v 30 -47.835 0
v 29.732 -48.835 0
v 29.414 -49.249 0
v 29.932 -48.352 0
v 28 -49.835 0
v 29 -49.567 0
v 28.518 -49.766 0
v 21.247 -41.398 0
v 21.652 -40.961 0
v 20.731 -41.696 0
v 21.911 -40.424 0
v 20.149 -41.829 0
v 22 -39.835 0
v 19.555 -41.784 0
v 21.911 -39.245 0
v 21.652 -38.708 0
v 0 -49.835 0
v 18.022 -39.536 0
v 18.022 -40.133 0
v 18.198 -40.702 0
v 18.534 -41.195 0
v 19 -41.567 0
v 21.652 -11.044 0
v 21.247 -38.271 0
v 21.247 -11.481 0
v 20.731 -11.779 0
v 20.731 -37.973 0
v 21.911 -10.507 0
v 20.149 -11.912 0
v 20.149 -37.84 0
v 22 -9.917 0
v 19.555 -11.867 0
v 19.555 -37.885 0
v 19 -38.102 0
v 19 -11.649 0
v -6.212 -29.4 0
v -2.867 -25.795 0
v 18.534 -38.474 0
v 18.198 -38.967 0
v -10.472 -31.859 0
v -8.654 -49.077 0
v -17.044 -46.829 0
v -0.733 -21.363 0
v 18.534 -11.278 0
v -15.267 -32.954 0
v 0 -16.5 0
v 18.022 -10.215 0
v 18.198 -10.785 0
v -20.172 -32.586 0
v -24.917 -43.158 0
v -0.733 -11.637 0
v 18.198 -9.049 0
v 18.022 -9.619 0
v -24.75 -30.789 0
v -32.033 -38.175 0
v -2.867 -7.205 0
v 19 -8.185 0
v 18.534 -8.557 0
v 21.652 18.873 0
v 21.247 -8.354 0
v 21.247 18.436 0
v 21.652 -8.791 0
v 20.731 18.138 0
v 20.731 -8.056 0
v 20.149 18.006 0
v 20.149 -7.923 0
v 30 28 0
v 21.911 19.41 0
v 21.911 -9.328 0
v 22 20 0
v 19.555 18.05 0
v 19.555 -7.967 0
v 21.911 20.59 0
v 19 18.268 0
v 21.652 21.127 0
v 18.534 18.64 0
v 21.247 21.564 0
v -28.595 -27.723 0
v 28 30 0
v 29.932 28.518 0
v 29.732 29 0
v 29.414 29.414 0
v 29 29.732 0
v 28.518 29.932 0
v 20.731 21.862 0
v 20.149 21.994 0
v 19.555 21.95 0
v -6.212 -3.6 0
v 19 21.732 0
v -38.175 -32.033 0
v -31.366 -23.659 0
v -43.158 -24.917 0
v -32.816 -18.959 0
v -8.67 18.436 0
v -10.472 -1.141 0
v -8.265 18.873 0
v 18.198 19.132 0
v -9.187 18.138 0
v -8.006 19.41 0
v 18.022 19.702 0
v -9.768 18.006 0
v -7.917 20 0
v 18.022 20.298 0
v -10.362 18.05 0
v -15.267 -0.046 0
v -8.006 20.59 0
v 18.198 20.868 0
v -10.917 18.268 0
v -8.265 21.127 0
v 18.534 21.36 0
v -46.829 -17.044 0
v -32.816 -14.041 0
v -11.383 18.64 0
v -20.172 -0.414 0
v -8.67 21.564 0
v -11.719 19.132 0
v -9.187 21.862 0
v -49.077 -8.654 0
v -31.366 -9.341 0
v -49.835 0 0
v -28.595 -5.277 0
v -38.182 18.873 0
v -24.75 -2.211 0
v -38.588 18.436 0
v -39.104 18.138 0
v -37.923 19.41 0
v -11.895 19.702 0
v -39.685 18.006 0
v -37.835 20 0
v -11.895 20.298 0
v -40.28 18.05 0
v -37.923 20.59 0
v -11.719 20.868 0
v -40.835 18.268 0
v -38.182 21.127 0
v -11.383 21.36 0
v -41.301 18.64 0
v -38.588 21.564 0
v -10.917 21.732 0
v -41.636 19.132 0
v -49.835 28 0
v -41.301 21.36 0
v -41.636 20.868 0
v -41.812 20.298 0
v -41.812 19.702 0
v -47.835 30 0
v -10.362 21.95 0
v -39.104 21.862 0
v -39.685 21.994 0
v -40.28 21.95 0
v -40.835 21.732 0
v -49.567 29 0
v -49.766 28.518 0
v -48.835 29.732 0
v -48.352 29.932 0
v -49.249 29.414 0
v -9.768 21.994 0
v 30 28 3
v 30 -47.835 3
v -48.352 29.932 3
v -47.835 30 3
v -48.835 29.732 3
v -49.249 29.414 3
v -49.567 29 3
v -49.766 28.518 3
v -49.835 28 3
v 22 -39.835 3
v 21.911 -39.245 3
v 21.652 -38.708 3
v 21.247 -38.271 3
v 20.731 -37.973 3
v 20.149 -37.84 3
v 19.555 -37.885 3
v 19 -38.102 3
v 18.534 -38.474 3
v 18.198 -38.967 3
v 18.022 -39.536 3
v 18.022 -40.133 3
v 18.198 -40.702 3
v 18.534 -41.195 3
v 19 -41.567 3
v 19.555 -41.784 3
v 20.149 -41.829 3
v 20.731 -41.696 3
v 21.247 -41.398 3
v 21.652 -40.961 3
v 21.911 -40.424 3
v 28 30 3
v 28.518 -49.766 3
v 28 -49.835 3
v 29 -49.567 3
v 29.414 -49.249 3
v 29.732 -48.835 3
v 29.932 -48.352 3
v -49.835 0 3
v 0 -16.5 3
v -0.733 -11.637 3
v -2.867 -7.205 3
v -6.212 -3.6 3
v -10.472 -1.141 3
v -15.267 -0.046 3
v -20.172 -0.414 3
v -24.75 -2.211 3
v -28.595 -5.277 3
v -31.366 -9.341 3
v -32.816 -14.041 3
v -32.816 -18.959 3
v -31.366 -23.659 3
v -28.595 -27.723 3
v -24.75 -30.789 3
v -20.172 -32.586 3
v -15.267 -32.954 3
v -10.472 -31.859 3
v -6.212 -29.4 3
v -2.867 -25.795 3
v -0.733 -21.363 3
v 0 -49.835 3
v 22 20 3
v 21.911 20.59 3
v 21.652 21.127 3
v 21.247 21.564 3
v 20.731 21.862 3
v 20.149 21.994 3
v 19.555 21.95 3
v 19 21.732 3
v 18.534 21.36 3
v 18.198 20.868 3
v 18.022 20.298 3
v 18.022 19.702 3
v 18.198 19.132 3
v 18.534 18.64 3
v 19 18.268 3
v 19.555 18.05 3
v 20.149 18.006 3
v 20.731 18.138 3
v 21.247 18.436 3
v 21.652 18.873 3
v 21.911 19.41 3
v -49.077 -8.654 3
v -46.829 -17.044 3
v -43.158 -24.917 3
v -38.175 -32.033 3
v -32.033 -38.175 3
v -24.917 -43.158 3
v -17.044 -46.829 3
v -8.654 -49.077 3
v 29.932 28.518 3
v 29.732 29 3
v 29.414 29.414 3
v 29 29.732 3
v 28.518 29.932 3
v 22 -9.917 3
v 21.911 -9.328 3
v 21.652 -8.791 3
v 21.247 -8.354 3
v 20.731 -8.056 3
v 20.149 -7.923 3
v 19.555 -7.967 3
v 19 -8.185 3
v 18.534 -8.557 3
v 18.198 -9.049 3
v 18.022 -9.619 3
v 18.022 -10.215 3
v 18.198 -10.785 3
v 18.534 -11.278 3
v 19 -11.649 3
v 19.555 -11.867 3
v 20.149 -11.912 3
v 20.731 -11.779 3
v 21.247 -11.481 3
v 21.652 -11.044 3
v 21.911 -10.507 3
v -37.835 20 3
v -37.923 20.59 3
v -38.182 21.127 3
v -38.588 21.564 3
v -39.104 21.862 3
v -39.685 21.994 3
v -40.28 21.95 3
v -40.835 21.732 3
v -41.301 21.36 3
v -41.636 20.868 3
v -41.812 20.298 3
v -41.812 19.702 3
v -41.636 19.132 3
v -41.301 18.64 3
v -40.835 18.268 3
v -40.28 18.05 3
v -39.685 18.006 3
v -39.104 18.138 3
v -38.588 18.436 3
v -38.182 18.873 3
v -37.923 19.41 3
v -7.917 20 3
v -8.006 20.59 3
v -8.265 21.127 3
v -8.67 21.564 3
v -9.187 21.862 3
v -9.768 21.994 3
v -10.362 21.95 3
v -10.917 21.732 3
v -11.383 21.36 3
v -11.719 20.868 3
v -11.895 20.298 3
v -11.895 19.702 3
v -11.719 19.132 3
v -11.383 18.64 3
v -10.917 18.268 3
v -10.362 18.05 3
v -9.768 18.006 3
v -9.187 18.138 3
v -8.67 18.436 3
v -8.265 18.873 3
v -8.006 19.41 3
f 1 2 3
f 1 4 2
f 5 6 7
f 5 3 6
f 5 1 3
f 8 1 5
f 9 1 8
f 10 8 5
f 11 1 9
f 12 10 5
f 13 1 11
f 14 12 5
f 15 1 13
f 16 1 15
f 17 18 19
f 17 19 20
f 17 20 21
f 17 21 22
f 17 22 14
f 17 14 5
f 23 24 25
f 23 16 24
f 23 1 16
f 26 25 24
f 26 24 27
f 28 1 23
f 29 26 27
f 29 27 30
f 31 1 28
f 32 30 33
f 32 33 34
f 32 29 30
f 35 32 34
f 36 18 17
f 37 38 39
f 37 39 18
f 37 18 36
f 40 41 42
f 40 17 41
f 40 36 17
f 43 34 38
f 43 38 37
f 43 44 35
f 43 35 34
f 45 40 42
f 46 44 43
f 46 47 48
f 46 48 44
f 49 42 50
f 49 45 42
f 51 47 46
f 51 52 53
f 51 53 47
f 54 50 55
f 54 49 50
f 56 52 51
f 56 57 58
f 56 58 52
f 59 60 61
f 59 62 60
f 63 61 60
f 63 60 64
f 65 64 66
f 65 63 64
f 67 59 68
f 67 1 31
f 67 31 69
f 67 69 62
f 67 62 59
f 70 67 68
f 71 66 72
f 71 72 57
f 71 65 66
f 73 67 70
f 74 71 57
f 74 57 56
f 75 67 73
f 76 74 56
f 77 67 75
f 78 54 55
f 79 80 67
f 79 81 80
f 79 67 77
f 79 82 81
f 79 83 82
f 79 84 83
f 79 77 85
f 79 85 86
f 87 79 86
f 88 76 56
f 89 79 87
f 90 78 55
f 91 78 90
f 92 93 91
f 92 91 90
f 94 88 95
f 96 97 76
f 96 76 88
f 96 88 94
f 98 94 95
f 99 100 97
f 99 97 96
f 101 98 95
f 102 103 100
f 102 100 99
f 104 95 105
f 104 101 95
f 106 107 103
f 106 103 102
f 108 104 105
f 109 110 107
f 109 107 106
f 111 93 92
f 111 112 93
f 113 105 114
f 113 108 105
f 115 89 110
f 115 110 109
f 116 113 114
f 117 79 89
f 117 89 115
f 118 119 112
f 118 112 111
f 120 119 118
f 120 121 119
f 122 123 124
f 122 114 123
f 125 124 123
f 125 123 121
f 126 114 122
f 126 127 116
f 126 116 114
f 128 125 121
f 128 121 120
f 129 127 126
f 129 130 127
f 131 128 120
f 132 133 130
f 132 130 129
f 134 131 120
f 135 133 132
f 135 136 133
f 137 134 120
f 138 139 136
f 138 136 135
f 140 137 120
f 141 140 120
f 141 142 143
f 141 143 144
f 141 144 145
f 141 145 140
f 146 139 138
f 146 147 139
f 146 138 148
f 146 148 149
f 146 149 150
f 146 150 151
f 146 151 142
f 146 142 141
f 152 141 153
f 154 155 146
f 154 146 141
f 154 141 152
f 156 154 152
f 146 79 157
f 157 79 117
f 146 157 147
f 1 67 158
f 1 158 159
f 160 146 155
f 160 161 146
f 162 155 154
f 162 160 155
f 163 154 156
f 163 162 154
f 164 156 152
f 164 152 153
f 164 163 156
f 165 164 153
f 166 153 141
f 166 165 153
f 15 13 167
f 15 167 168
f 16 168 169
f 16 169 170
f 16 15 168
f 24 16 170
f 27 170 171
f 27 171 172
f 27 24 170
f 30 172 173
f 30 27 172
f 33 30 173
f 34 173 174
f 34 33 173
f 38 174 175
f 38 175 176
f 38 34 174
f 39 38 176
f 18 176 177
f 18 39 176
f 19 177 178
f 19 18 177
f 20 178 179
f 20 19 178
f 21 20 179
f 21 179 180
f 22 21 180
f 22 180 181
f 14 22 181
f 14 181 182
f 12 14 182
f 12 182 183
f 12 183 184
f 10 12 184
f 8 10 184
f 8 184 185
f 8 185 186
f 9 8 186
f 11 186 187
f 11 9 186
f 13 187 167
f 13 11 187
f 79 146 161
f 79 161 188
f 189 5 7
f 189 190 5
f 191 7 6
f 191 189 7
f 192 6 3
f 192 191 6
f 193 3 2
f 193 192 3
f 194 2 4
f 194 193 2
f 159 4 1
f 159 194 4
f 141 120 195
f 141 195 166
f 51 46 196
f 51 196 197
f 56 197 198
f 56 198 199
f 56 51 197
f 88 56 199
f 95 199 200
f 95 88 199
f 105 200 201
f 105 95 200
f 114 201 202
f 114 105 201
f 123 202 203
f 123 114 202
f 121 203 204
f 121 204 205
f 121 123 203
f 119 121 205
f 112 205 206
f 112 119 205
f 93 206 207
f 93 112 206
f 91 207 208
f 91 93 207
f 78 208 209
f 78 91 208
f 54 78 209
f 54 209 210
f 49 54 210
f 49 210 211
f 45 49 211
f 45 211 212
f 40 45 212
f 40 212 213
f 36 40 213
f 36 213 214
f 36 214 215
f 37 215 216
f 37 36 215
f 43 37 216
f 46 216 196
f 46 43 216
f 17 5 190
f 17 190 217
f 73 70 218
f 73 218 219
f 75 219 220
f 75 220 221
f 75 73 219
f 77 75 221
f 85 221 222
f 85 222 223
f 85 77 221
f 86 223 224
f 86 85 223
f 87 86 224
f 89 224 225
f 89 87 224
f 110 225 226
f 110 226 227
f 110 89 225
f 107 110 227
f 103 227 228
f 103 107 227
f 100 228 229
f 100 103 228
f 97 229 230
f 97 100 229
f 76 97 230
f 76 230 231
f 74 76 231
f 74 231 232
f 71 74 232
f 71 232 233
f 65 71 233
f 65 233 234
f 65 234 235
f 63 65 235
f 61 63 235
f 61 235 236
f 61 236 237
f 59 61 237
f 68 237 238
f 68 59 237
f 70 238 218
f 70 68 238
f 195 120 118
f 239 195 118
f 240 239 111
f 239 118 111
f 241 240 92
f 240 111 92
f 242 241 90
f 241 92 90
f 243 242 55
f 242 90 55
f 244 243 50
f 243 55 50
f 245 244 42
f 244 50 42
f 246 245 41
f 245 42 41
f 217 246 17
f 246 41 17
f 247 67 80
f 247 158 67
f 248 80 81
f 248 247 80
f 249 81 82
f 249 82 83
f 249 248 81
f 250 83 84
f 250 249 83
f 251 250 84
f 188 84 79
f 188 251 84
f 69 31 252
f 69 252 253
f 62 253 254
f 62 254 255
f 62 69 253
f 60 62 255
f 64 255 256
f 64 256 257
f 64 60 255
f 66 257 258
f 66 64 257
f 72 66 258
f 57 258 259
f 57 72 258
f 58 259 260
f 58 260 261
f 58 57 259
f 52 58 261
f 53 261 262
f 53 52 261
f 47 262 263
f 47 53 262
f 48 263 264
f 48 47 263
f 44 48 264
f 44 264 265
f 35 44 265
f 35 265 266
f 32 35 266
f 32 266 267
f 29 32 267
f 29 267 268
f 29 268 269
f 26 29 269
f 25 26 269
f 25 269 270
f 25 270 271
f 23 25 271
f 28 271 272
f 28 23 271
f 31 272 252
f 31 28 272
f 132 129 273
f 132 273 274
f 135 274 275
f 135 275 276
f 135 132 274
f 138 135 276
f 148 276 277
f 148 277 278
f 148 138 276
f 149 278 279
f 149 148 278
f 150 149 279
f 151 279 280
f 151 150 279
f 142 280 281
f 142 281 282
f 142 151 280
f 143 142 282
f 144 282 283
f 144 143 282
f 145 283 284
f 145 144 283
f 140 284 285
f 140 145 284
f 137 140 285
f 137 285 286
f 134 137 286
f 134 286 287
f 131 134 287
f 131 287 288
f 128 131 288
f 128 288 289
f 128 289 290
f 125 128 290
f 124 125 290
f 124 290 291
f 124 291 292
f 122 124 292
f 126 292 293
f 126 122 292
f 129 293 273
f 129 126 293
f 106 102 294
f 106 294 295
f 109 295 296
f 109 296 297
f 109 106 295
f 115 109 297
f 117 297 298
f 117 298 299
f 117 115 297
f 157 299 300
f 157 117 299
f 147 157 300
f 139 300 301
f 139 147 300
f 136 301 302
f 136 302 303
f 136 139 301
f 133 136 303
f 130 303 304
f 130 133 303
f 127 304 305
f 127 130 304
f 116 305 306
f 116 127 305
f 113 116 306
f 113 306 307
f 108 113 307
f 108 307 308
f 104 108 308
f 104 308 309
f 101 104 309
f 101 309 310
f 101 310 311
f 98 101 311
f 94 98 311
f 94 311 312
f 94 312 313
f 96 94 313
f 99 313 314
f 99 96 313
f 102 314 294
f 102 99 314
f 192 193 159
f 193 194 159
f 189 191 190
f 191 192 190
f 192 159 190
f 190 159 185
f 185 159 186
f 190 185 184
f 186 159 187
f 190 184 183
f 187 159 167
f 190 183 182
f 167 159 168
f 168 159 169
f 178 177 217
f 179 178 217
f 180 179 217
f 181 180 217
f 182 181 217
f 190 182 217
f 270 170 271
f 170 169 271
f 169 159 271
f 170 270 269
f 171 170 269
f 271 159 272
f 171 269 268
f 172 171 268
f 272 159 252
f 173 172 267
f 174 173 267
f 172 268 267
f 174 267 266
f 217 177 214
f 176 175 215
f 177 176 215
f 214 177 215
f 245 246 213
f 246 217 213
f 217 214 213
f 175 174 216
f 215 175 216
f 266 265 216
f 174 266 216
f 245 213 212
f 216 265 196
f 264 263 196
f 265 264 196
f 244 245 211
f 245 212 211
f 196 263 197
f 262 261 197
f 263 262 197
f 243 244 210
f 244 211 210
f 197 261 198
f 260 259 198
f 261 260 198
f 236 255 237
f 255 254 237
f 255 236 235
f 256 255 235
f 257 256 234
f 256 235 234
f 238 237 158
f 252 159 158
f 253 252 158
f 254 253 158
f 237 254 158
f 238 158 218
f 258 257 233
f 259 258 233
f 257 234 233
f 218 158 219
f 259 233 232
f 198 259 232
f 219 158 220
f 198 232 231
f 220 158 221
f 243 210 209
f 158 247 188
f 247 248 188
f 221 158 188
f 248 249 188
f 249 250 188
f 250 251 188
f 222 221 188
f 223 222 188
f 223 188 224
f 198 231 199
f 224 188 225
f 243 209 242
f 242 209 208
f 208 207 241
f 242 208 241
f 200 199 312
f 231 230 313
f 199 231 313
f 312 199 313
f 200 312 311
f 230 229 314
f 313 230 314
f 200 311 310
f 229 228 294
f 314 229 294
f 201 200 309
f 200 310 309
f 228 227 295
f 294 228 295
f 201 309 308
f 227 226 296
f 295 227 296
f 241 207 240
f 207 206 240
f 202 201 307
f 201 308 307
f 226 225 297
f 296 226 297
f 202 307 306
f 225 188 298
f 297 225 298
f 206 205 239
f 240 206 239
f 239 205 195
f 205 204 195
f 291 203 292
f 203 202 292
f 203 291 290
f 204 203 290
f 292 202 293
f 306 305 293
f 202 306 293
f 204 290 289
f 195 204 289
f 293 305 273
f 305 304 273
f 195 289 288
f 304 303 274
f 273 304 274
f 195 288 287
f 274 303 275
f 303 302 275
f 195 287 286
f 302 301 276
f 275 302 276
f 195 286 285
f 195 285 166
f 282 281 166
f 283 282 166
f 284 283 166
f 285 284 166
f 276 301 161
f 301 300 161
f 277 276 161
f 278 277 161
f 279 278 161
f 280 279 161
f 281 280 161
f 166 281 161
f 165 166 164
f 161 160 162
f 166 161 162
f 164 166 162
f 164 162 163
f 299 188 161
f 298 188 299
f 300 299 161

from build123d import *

# Parameters (mm, degrees)
SKETCH_R   = 16.5
SKETCH_R_2 = 2
PAD_DEPTH  = 3
FILLET_R   = 2


with BuildPart() as part:
    # Sketch → Pad (new body)
    with BuildSketch(Plane.XY):
        with BuildLine():
            Line((30, 0), (30, -49.834524))
            Line((30, -49.834524), (0, -49.834524))
            ThreePointArc((-49.834524, 0), (-35.23833, -35.23833), (0, -49.834524))
            Line((-49.834524, 0), (-49.834524, 20))
            Line((-49.834524, 20), (-49.834524, 30))
            Line((-49.834524, 30), (30, 30))
            Line((30, 30), (30, 0))
        make_face()
        with Locations((-16.5, -16.5)):
            Circle(SKETCH_R, mode=Mode.SUBTRACT)
        with Locations((-39.834524, 20)):
            Circle(SKETCH_R_2, mode=Mode.SUBTRACT)
        with Locations((-9.917262, 20)):
            Circle(SKETCH_R_2, mode=Mode.SUBTRACT)
        with Locations((20, 20)):
            Circle(SKETCH_R_2, mode=Mode.SUBTRACT)
        with Locations((20, -9.917262)):
            Circle(SKETCH_R_2, mode=Mode.SUBTRACT)
        with Locations((20, -39.834524)):
            Circle(SKETCH_R_2, mode=Mode.SUBTRACT)
    extrude(amount=PAD_DEPTH)

    # Fillet
    fillet_edges = [part.edges().sort_by_distance(p)[0] for p in [
        (30, -49.834524, 1.5),
        (30, 30, 1.5),
        (-49.834524, 30, 1.5),
    ]]
    fillet(fillet_edges, radius=FILLET_R)


solid = part.part
